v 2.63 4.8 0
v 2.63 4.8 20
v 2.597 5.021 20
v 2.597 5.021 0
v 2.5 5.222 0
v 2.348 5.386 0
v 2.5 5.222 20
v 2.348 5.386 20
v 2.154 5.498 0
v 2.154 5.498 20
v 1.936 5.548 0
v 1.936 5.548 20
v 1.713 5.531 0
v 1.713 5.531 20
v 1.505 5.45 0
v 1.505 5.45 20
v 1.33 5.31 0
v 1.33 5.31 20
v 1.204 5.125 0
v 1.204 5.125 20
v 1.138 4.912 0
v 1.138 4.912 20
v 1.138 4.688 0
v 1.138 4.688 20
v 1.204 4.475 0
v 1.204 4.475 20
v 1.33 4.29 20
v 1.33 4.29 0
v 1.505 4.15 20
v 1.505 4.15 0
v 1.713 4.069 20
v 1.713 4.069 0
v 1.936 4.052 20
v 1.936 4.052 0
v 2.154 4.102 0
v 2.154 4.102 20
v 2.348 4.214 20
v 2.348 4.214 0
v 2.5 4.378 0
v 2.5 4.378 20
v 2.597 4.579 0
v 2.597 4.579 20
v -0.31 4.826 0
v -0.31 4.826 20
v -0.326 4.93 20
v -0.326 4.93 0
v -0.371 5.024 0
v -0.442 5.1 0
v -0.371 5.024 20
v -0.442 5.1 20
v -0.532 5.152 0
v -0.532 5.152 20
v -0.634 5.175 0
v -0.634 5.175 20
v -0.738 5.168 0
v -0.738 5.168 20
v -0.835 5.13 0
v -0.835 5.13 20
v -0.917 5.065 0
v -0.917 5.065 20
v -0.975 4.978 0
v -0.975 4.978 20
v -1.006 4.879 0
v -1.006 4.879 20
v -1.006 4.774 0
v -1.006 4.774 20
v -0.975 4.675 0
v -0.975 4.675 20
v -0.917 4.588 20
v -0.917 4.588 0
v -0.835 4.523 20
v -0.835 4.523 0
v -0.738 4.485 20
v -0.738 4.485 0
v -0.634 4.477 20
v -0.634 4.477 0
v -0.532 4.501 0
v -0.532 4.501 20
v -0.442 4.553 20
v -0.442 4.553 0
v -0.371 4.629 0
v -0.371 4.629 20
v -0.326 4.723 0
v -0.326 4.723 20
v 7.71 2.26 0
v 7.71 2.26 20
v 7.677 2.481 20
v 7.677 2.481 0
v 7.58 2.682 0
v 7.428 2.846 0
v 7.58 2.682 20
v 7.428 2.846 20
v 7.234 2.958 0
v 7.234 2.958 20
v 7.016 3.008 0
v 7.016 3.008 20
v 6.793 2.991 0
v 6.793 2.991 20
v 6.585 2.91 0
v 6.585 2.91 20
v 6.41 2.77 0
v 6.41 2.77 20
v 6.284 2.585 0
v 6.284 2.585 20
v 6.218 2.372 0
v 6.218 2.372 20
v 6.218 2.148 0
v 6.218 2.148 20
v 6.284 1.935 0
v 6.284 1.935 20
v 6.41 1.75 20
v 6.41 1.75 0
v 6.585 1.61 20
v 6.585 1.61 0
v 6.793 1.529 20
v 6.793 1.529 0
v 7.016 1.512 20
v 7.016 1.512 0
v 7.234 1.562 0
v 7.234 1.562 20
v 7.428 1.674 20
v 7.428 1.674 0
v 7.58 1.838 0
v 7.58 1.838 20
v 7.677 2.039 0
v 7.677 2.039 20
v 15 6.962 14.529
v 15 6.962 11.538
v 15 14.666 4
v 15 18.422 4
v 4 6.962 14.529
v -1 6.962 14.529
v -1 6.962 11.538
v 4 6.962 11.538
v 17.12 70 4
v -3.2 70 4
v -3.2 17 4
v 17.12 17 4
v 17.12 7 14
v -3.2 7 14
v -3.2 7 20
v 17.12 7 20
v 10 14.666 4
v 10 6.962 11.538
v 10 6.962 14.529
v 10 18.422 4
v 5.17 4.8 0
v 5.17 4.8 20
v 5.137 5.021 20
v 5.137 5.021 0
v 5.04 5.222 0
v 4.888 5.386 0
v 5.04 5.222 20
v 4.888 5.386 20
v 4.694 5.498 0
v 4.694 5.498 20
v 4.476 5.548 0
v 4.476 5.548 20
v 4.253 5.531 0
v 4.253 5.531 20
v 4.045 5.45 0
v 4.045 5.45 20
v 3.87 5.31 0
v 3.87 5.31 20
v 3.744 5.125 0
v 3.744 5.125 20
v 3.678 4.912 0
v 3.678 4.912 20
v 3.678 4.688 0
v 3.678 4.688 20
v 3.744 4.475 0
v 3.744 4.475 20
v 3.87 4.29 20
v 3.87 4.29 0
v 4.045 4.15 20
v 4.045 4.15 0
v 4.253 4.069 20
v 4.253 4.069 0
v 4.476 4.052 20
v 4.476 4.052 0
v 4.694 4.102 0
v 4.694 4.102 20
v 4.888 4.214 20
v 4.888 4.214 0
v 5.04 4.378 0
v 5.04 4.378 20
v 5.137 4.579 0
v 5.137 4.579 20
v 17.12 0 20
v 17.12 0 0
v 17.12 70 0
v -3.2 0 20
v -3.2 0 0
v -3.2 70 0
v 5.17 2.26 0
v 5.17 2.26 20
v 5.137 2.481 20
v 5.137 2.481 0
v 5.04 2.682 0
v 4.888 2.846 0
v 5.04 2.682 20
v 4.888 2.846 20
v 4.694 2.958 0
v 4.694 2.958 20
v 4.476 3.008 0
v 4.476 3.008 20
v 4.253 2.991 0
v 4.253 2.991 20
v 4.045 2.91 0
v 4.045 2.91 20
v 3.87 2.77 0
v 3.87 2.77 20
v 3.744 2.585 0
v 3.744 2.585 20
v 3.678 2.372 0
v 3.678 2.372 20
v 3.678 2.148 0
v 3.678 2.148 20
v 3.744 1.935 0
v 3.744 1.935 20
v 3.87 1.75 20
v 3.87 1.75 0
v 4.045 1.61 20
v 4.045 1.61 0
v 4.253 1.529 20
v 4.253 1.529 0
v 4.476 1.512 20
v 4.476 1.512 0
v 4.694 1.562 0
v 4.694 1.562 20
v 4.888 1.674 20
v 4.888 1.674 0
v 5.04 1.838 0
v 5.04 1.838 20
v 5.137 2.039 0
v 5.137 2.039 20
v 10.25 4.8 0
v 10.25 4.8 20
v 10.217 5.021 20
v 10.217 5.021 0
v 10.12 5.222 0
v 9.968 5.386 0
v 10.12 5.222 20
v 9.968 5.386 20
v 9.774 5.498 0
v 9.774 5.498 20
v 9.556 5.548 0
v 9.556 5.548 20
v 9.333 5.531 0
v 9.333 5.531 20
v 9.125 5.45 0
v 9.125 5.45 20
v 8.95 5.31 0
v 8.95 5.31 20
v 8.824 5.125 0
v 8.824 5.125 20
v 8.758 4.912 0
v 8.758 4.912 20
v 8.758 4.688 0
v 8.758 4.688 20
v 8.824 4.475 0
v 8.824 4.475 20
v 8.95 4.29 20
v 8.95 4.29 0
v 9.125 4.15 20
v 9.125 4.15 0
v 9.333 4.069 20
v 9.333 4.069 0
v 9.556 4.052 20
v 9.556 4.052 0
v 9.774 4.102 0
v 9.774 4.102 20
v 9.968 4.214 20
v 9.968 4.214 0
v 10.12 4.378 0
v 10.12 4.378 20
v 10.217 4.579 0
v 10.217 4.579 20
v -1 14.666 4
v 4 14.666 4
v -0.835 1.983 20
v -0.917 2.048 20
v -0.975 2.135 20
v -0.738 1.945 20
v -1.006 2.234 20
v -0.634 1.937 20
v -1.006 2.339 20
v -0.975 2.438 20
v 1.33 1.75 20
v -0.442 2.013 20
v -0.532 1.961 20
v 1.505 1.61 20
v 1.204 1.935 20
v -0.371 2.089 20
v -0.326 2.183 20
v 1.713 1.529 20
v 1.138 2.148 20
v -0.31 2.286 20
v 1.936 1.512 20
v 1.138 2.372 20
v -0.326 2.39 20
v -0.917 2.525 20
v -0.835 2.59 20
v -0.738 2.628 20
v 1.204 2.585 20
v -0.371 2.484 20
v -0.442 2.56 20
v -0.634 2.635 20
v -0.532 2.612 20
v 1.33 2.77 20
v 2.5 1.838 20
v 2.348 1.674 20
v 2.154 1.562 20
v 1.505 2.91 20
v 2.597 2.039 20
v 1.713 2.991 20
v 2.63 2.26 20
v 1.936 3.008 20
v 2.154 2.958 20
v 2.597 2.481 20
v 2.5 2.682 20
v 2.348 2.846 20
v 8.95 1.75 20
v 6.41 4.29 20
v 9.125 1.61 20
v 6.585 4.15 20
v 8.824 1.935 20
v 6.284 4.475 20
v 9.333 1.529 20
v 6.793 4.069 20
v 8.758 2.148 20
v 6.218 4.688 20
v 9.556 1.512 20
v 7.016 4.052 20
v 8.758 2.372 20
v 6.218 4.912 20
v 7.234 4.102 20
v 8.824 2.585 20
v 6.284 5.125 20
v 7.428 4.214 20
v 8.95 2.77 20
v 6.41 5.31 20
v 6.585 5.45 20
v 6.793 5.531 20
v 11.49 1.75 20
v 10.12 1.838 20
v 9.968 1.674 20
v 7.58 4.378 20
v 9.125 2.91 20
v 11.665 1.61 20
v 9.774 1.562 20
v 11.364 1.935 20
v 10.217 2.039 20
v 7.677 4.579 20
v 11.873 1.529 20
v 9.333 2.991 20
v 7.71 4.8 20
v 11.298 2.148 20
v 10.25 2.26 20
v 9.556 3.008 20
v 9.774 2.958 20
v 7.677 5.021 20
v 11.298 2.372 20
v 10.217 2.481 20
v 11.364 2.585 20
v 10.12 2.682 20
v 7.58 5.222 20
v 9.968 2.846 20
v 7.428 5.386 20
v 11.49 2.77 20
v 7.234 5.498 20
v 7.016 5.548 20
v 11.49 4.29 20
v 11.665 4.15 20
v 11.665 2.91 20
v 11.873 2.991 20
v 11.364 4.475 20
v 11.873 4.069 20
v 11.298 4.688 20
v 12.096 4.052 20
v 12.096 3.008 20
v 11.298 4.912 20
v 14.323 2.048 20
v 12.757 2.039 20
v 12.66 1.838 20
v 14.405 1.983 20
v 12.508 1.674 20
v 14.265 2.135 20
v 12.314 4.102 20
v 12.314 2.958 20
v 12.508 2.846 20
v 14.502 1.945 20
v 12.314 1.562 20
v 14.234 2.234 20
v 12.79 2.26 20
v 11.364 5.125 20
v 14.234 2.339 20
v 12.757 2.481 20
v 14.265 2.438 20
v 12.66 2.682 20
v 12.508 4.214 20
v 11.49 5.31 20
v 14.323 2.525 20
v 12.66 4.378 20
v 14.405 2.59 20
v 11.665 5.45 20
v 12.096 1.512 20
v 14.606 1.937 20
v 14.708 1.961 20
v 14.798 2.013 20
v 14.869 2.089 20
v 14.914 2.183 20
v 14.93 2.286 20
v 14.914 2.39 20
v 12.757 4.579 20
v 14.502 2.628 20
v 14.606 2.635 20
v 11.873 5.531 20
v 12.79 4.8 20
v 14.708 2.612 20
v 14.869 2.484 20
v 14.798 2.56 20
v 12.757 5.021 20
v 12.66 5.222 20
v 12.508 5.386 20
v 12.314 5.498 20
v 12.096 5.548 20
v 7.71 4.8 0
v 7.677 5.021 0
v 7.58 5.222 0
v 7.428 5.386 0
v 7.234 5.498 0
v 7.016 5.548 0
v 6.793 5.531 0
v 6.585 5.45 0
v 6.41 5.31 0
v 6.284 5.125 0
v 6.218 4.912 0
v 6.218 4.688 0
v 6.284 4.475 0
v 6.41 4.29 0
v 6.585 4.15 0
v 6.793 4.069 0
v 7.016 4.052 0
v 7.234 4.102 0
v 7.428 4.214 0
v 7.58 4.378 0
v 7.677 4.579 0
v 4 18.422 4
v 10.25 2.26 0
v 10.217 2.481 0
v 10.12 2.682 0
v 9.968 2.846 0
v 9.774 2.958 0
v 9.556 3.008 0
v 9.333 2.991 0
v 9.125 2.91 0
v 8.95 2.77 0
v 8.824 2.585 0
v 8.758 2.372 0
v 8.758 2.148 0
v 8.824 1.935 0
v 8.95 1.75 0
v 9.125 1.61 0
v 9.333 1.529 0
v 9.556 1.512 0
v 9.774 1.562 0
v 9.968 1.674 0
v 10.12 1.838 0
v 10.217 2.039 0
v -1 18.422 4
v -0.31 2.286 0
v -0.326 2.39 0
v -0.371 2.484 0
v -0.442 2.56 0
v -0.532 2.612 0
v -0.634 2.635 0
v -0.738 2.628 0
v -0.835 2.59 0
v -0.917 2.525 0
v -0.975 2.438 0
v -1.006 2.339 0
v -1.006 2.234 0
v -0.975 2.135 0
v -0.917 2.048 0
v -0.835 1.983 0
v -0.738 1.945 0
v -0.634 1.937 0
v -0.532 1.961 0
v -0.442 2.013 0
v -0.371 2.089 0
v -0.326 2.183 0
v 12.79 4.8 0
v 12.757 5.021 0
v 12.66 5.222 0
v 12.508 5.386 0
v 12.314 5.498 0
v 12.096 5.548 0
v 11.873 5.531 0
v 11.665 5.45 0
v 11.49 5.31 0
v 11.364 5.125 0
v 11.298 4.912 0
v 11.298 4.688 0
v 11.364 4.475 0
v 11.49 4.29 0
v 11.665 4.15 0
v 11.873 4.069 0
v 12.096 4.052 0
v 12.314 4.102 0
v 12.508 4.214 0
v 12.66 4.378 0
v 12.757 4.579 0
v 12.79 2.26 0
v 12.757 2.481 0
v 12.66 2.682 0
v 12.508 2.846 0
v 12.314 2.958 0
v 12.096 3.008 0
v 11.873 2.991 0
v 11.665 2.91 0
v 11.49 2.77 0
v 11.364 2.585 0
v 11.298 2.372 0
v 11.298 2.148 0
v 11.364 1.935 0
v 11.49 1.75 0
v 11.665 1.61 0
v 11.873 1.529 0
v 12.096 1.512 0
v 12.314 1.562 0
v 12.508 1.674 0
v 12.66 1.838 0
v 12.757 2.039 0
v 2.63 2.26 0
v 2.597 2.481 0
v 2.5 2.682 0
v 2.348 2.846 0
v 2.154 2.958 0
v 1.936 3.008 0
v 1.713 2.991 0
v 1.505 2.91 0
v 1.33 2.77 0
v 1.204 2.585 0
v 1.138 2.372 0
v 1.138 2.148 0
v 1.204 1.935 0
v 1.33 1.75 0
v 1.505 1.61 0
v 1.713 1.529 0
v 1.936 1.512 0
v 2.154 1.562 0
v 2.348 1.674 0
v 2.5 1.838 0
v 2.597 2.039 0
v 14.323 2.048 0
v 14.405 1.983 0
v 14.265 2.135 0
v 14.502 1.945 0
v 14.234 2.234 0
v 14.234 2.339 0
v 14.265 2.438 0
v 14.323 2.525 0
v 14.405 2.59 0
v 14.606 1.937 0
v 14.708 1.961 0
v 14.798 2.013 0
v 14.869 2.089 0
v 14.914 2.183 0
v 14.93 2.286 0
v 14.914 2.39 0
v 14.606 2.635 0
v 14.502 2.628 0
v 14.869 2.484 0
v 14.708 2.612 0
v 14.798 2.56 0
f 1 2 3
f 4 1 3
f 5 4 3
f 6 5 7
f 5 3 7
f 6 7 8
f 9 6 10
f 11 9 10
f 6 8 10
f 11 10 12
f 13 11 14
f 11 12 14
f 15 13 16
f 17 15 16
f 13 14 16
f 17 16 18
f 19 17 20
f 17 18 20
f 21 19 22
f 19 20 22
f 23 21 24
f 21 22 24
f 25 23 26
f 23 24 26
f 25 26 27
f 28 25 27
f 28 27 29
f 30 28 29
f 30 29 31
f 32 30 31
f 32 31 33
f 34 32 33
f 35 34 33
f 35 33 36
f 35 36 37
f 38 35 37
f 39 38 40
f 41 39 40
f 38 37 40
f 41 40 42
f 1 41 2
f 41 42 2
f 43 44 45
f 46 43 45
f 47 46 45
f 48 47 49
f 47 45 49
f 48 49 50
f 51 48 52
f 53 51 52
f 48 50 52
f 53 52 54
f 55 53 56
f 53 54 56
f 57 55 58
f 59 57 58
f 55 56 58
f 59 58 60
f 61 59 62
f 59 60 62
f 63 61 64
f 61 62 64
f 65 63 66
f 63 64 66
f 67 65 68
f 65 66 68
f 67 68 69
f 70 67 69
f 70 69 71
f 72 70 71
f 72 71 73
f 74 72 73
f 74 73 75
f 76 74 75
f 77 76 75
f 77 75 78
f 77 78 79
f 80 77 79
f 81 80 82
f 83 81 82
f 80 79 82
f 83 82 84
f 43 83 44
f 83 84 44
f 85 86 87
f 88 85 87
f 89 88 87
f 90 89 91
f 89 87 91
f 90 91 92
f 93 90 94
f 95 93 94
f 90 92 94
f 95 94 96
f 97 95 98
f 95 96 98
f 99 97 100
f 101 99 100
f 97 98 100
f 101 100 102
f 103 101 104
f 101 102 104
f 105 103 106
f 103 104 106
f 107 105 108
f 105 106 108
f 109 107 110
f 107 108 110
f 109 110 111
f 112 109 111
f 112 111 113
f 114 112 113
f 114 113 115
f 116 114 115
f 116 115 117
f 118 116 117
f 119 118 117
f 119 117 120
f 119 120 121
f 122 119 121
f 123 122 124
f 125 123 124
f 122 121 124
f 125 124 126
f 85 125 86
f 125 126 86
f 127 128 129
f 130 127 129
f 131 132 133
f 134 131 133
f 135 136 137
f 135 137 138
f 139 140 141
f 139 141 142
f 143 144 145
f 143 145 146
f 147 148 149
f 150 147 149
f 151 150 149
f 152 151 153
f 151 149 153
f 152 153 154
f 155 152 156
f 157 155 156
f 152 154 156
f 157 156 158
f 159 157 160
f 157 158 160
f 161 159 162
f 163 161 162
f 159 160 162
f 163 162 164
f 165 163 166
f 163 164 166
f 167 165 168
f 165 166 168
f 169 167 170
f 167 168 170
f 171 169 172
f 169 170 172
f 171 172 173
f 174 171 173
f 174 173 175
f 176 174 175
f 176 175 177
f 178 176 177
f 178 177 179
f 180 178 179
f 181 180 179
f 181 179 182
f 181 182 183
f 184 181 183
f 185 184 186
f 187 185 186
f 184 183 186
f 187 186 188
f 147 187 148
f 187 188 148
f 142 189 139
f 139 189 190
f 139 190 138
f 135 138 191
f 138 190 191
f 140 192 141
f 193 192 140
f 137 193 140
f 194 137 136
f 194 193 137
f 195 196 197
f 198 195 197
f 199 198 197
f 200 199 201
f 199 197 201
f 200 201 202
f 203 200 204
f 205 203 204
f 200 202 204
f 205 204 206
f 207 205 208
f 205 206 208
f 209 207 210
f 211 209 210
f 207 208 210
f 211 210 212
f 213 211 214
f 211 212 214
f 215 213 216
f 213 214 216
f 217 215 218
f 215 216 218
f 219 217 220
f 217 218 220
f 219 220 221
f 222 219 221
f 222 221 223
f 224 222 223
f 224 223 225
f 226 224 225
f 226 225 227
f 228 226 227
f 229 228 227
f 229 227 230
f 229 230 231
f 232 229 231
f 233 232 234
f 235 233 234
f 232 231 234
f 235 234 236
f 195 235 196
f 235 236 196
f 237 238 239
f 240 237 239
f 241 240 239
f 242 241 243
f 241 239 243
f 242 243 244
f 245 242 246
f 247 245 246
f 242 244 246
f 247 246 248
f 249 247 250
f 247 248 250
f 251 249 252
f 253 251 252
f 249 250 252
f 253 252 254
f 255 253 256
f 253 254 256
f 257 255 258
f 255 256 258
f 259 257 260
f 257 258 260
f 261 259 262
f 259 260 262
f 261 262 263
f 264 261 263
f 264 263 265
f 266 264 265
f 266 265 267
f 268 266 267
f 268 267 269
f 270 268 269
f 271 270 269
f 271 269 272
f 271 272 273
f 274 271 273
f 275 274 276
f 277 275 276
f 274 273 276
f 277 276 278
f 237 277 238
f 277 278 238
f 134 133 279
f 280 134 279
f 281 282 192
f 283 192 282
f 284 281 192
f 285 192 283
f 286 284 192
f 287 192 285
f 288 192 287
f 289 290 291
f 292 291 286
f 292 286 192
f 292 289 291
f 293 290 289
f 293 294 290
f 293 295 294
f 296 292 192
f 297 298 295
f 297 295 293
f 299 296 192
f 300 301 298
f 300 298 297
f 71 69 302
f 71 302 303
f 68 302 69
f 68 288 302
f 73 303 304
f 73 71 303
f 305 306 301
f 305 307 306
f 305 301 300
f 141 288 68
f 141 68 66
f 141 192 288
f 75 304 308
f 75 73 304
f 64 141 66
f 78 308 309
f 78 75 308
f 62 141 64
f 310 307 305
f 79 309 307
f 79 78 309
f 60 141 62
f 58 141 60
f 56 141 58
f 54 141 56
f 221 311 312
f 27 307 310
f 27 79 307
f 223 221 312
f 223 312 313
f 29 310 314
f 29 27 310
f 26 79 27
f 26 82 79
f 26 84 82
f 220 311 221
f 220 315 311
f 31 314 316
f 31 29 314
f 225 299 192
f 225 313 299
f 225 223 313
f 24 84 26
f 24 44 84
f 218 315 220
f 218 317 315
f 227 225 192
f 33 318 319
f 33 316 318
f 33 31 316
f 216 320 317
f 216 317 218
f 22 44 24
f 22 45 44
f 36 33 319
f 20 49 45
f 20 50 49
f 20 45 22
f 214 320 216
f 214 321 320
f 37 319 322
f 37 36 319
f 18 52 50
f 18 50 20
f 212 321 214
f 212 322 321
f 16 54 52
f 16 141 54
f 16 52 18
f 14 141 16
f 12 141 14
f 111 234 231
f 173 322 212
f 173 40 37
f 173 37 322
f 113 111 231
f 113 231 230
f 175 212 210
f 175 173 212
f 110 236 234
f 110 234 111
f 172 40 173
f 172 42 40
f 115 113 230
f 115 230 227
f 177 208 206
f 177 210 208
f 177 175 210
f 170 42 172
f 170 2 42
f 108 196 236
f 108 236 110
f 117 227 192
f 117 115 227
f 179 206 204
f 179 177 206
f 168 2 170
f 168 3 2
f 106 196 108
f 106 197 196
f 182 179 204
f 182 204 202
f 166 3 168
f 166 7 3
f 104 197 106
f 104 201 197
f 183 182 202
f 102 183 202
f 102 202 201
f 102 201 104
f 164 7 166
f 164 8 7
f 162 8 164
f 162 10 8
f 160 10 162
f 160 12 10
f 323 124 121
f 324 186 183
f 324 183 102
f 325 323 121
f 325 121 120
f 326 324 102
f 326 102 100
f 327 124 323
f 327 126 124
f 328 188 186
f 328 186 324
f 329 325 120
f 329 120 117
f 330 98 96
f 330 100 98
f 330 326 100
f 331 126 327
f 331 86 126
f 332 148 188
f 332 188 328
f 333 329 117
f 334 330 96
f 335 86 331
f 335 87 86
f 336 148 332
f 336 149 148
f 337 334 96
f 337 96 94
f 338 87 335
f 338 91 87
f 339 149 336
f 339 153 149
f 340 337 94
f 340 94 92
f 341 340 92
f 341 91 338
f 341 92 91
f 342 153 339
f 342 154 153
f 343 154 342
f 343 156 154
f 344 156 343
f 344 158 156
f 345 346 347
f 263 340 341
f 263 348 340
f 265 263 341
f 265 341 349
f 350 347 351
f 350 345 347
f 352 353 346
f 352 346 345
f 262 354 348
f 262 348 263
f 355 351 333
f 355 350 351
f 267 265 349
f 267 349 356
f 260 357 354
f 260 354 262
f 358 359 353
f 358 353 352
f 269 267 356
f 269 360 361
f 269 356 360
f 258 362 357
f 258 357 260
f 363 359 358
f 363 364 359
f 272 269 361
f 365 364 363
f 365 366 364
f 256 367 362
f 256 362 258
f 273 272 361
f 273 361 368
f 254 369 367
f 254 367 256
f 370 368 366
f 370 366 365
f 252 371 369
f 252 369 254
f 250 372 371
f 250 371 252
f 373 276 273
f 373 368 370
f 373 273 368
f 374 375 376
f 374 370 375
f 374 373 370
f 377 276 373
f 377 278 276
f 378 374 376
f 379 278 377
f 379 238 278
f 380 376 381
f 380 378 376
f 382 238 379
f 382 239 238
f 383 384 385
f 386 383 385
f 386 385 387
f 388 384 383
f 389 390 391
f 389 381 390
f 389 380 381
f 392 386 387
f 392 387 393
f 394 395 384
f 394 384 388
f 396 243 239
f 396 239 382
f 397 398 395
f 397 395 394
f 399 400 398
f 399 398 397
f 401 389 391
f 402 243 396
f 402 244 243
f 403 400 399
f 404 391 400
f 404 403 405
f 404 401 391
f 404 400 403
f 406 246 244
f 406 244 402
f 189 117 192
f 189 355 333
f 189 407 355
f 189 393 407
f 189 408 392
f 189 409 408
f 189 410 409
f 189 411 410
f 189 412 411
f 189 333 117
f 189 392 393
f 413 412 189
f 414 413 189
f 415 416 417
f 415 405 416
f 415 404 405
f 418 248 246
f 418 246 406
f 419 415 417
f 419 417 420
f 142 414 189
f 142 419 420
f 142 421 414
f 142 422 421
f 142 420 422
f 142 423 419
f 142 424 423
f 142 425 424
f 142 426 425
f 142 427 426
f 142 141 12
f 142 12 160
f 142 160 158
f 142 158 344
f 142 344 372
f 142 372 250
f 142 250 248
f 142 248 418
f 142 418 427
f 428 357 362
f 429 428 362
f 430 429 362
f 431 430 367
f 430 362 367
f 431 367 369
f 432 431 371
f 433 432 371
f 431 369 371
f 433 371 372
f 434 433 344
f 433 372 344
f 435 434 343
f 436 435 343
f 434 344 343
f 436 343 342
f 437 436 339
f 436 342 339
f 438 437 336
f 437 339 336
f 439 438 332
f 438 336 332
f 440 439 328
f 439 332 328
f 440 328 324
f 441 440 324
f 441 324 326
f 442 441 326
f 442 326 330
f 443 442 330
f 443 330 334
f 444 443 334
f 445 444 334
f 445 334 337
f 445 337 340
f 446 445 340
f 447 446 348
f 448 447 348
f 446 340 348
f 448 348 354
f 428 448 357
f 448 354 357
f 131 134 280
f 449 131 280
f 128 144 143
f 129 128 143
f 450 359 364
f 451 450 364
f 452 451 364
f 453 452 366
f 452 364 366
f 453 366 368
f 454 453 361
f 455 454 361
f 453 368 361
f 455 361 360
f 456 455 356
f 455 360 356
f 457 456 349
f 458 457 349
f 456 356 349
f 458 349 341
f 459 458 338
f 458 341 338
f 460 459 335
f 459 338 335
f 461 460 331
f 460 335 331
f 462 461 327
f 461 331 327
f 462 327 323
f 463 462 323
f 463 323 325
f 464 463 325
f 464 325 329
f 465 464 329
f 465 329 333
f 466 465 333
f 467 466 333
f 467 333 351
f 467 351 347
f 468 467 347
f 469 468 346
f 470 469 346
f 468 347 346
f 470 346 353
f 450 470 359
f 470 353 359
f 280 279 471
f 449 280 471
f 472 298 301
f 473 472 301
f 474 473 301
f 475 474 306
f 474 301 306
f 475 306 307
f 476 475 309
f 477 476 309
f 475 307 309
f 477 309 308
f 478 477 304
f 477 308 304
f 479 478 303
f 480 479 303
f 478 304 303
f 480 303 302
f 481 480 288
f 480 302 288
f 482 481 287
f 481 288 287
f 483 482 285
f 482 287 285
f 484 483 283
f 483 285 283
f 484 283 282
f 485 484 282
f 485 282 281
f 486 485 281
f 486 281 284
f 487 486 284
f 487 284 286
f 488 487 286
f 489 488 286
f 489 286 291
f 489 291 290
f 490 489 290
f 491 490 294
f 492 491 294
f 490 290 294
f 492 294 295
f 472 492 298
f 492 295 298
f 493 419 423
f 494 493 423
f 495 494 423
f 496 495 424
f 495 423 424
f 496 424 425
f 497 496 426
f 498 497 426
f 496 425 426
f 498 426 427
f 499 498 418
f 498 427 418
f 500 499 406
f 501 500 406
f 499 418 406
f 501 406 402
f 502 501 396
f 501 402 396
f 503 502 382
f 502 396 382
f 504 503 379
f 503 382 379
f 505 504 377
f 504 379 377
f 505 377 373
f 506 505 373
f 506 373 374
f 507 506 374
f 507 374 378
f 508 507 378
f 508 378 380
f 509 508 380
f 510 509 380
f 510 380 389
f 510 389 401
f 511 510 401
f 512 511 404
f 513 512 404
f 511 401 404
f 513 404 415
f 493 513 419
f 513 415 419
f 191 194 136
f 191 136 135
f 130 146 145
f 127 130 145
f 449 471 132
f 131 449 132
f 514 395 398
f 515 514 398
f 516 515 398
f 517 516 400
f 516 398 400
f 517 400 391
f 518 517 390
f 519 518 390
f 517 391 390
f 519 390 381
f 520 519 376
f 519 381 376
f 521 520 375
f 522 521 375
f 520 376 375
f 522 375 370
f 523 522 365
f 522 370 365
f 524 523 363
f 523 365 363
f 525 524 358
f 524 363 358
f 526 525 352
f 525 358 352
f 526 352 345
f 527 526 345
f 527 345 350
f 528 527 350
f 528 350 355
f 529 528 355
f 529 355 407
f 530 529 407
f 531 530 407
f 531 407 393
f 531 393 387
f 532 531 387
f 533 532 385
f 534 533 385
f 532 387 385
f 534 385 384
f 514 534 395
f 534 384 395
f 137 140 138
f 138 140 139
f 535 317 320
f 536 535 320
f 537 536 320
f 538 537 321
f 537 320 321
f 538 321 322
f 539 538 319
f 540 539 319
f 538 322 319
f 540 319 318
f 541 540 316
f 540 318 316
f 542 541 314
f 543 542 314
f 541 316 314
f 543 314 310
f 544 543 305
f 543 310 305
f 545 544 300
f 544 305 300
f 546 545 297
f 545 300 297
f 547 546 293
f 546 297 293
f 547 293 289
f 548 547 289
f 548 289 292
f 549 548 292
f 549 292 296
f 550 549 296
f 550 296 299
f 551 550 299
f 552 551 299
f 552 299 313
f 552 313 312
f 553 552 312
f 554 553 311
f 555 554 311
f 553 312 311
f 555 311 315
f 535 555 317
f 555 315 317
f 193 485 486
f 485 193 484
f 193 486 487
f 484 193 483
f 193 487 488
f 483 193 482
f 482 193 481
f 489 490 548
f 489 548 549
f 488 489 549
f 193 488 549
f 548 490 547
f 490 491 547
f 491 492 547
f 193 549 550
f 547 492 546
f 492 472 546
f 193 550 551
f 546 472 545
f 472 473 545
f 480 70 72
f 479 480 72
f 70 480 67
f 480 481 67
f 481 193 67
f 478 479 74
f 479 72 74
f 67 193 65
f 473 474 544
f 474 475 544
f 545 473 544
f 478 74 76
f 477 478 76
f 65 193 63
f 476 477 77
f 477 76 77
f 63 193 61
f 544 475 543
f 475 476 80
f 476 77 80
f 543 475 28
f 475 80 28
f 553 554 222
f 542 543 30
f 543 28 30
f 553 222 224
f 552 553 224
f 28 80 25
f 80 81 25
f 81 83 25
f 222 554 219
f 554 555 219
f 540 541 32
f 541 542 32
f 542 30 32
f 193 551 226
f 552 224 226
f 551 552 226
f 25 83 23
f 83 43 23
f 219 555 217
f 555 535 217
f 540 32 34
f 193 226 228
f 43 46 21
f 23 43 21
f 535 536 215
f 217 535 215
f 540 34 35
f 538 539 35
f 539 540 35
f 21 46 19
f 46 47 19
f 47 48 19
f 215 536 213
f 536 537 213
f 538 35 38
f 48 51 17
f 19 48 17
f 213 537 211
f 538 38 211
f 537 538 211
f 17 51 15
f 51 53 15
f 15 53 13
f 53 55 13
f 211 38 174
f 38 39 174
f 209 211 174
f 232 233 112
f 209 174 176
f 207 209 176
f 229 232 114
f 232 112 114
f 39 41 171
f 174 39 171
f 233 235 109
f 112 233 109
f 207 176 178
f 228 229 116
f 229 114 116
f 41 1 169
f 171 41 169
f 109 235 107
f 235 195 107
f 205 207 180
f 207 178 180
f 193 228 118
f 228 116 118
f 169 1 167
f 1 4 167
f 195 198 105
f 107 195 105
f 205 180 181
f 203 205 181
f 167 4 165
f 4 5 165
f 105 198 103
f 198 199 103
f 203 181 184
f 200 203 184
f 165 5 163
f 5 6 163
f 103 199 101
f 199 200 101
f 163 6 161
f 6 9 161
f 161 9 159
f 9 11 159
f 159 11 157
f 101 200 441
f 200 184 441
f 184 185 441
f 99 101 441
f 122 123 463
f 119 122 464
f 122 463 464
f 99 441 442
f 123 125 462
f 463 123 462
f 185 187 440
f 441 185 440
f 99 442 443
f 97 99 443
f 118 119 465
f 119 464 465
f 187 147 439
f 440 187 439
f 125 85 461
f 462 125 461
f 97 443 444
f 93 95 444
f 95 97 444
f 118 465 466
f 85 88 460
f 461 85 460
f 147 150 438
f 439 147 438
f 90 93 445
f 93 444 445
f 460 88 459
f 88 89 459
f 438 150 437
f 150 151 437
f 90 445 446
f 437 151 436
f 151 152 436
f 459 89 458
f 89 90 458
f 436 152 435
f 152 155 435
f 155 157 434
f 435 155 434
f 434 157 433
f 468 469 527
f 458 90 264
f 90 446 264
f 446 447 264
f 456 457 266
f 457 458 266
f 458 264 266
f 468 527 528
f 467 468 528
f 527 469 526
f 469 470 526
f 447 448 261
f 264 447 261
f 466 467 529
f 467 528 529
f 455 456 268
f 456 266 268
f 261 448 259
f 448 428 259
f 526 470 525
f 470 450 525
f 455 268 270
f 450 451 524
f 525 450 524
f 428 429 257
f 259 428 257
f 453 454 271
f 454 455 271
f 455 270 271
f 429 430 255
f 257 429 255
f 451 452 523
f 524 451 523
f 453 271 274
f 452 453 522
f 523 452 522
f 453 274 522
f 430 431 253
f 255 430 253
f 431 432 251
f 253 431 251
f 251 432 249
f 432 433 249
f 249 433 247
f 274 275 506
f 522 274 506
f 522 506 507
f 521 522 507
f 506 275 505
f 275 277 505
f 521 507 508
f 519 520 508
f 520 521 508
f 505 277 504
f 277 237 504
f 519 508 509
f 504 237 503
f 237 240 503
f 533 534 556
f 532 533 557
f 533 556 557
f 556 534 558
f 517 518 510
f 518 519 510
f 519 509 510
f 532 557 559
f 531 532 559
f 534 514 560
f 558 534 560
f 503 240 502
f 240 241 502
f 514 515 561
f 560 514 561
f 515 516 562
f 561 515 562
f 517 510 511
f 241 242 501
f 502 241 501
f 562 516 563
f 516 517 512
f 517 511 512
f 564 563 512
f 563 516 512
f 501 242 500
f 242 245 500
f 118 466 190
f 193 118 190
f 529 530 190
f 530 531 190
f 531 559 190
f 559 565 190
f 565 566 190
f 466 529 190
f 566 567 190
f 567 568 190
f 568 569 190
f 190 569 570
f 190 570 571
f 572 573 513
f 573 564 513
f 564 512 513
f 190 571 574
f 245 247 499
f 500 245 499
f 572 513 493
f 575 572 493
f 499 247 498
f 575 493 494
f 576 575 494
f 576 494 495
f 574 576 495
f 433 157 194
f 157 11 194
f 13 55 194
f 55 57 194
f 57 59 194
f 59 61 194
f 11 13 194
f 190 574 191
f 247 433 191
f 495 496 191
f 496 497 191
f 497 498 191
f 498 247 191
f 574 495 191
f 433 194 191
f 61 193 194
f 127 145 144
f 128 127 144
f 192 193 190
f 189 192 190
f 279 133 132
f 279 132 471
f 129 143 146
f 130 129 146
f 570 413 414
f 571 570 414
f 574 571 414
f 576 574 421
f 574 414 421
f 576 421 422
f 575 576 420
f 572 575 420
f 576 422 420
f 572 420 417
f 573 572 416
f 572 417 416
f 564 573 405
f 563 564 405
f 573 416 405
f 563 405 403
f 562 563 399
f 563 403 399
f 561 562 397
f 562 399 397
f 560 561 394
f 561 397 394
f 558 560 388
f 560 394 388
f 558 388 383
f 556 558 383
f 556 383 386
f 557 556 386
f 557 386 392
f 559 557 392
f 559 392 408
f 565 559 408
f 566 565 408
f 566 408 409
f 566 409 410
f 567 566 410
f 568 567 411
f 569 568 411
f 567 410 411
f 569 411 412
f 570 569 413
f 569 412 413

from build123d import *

# Parameters (mm, degrees)
PAD_DEPTH    = 5
PAD001_DEPTH = 5
BOX002_W     = 20.32
BOX002_H     = 63
BOX002_DEPTH = 4
BOX_W        = 20.32
BOX_H        = 7
BOX_DEPTH    = 20
SKETCH_R     = 0.75
SKETCH_R_2   = 0.35
POCKET_DEPTH = 20
CHAMFER_SIZE = 10


with BuildPart() as pad:
    # Sketch001 → Pad (new body)
    with BuildSketch(Plane.YZ.offset(-1)):
        Polygon((6.961547, 14.529416), (6.961547, 11.537694), (14.666037, 4), (18.422146, 4), align=None)
    extrude(amount=PAD_DEPTH)


with BuildPart() as pad001:
    # Sketch002 → Pad001 (new body)
    with BuildSketch(Plane.YZ.offset(10)):
        Polygon((6.961547, 14.529416), (6.961547, 11.537694), (14.666037, 4), (18.422146, 4), align=None)
    extrude(amount=PAD001_DEPTH)


with BuildPart() as cube002:
    # Box002 → Box002 (new body)
    with BuildSketch(Plane(origin=(-3.2, 7, 0), x_dir=(1, 0, 0), z_dir=(0, 0, 1))):
        with Locations((10.16, 31.5)):
            Rectangle(BOX002_W, BOX002_H)
    extrude(amount=BOX002_DEPTH)


with BuildPart() as chamfer_body:
    # Box → Box (new body)
    with BuildSketch(Plane(origin=(-3.2, 0, 0), x_dir=(1, 0, 0), z_dir=(0, 0, 1))):
        with Locations((10.16, 3.5)):
            Rectangle(BOX_W, BOX_H)
    extrude(amount=BOX_DEPTH)

    # Sketch → Pocket (cut)
    with BuildSketch(Plane(origin=(-3.2, 0, 20), x_dir=(1, 0, 0), z_dir=(0, 0, 1))):
        with Locations((5.08, 2.26)):
            Circle(SKETCH_R)
        with Locations((7.62, 2.26)):
            Circle(SKETCH_R)
        with Locations((10.16, 2.26)):
            Circle(SKETCH_R)
        with Locations((12.7, 2.26)):
            Circle(SKETCH_R)
        with Locations((15.24, 2.26)):
            Circle(SKETCH_R)
        with Locations((5.08, 4.8)):
            Circle(SKETCH_R)
        with Locations((7.62, 4.8)):
            Circle(SKETCH_R)
        with Locations((10.16, 4.8)):
            Circle(SKETCH_R)
        with Locations((12.7, 4.8)):
            Circle(SKETCH_R)
        with Locations((15.24, 4.8)):
            Circle(SKETCH_R)
        with Locations((2.54, 2.286478)):
            Circle(SKETCH_R_2)
        with Locations((2.54, 4.826478)):
            Circle(SKETCH_R_2)
        with Locations((17.78, 2.286478)):
            Circle(SKETCH_R_2)
    extrude(amount=-POCKET_DEPTH, mode=Mode.SUBTRACT)

    # Fusion: union Cube002
    add(cube002.part)

    # Chamfer
    chamfer_edges = [chamfer_body.edges().sort_by_distance(p)[0] for p in [
        (6.96, 7, 4),
    ]]
    chamfer(chamfer_edges, length=CHAMFER_SIZE)


solid = Compound([pad.part, pad001.part, chamfer_body.part])
